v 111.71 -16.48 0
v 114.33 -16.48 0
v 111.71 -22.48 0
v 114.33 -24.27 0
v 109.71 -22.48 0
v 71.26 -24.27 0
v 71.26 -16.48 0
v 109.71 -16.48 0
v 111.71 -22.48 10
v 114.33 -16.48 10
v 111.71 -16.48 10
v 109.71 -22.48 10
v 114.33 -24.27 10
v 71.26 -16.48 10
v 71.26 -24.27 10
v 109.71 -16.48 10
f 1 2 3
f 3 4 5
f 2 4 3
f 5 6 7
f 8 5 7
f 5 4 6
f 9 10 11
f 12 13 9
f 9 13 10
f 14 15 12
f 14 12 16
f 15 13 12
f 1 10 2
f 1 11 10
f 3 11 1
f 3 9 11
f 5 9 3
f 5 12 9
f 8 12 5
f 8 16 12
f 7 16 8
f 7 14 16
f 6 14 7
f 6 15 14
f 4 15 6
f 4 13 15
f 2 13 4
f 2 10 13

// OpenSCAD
linear_extrude(height = 10, center = false) {

polygon(points=[[111.71,-16.48],[111.71,-16.86],[111.71,-17.23],[111.71,-17.61],[111.71,-17.98],[111.71,-18.36],[111.71,-18.73],[111.71,-19.11],[111.71,-19.48],[111.71,-19.86],[111.71,-20.23],[111.71,-20.61],[111.71,-20.98],[111.71,-21.36],[111.71,-21.73],[111.71,-22.11],[111.71,-22.48],[111.59,-22.48],[111.46,-22.48],[111.34,-22.48],[111.21,-22.48],[111.09,-22.48],[110.96,-22.48],[110.84,-22.48],[110.71,-22.48],[110.59,-22.48],[110.46,-22.48],[110.34,-22.48],[110.21,-22.48],[110.09,-22.48],[109.96,-22.48],[109.84,-22.48],[109.71,-22.48],[109.71,-22.11],[109.71,-21.73],[109.71,-21.36],[109.71,-20.98],[109.71,-20.61],[109.71,-20.23],[109.71,-19.86],[109.71,-19.48],[109.71,-19.11],[109.71,-18.73],[109.71,-18.36],[109.71,-17.98],[109.71,-17.61],[109.71,-17.23],[109.71,-16.86],[109.71,-16.48],[107.31,-16.48],[104.91,-16.48],[102.5,-16.48],[100.1,-16.48],[97.7,-16.48],[95.29,-16.48],[92.89,-16.48],[90.49,-16.48],[88.08,-16.48],[85.68,-16.48],[83.28,-16.48],[80.87,-16.48],[78.47,-16.48],[76.07,-16.48],[73.66,-16.48],[71.26,-16.48],[71.26,-16.97],[71.26,-17.46],[71.26,-17.94],[71.26,-18.43],[71.26,-18.92],[71.26,-19.4],[71.26,-19.89],[71.26,-20.38],[71.26,-20.86],[71.26,-21.35],[71.26,-21.84],[71.26,-22.32],[71.26,-22.81],[71.26,-23.3],[71.26,-23.78],[71.26,-24.27],[73.95,-24.27],[76.64,-24.27],[79.34,-24.27],[82.03,-24.27],[84.72,-24.27],[87.41,-24.27],[90.1,-24.27],[92.79,-24.27],[95.49,-24.27],[98.18,-24.27],[100.87,-24.27],[103.56,-24.27],[106.25,-24.27],[108.94,-24.27],[111.64,-24.27],[114.33,-24.27],[114.33,-23.78],[114.33,-23.3],[114.33,-22.81],[114.33,-22.32],[114.33,-21.84],[114.33,-21.35],[114.33,-20.86],[114.33,-20.38],[114.33,-19.89],[114.33,-19.4],[114.33,-18.92],[114.33,-18.43],[114.33,-17.94],[114.33,-17.46],[114.33,-16.97],[114.33,-16.48],[114.16,-16.48],[114,-16.48],[113.84,-16.48],[113.67,-16.48],[113.51,-16.48],[113.35,-16.48],[113.18,-16.48],[113.02,-16.48],[112.86,-16.48],[112.69,-16.48],[112.53,-16.48],[112.37,-16.48],[112.2,-16.48],[112.04,-16.48],[111.88,-16.48],[111.71,-16.48]]);

}
